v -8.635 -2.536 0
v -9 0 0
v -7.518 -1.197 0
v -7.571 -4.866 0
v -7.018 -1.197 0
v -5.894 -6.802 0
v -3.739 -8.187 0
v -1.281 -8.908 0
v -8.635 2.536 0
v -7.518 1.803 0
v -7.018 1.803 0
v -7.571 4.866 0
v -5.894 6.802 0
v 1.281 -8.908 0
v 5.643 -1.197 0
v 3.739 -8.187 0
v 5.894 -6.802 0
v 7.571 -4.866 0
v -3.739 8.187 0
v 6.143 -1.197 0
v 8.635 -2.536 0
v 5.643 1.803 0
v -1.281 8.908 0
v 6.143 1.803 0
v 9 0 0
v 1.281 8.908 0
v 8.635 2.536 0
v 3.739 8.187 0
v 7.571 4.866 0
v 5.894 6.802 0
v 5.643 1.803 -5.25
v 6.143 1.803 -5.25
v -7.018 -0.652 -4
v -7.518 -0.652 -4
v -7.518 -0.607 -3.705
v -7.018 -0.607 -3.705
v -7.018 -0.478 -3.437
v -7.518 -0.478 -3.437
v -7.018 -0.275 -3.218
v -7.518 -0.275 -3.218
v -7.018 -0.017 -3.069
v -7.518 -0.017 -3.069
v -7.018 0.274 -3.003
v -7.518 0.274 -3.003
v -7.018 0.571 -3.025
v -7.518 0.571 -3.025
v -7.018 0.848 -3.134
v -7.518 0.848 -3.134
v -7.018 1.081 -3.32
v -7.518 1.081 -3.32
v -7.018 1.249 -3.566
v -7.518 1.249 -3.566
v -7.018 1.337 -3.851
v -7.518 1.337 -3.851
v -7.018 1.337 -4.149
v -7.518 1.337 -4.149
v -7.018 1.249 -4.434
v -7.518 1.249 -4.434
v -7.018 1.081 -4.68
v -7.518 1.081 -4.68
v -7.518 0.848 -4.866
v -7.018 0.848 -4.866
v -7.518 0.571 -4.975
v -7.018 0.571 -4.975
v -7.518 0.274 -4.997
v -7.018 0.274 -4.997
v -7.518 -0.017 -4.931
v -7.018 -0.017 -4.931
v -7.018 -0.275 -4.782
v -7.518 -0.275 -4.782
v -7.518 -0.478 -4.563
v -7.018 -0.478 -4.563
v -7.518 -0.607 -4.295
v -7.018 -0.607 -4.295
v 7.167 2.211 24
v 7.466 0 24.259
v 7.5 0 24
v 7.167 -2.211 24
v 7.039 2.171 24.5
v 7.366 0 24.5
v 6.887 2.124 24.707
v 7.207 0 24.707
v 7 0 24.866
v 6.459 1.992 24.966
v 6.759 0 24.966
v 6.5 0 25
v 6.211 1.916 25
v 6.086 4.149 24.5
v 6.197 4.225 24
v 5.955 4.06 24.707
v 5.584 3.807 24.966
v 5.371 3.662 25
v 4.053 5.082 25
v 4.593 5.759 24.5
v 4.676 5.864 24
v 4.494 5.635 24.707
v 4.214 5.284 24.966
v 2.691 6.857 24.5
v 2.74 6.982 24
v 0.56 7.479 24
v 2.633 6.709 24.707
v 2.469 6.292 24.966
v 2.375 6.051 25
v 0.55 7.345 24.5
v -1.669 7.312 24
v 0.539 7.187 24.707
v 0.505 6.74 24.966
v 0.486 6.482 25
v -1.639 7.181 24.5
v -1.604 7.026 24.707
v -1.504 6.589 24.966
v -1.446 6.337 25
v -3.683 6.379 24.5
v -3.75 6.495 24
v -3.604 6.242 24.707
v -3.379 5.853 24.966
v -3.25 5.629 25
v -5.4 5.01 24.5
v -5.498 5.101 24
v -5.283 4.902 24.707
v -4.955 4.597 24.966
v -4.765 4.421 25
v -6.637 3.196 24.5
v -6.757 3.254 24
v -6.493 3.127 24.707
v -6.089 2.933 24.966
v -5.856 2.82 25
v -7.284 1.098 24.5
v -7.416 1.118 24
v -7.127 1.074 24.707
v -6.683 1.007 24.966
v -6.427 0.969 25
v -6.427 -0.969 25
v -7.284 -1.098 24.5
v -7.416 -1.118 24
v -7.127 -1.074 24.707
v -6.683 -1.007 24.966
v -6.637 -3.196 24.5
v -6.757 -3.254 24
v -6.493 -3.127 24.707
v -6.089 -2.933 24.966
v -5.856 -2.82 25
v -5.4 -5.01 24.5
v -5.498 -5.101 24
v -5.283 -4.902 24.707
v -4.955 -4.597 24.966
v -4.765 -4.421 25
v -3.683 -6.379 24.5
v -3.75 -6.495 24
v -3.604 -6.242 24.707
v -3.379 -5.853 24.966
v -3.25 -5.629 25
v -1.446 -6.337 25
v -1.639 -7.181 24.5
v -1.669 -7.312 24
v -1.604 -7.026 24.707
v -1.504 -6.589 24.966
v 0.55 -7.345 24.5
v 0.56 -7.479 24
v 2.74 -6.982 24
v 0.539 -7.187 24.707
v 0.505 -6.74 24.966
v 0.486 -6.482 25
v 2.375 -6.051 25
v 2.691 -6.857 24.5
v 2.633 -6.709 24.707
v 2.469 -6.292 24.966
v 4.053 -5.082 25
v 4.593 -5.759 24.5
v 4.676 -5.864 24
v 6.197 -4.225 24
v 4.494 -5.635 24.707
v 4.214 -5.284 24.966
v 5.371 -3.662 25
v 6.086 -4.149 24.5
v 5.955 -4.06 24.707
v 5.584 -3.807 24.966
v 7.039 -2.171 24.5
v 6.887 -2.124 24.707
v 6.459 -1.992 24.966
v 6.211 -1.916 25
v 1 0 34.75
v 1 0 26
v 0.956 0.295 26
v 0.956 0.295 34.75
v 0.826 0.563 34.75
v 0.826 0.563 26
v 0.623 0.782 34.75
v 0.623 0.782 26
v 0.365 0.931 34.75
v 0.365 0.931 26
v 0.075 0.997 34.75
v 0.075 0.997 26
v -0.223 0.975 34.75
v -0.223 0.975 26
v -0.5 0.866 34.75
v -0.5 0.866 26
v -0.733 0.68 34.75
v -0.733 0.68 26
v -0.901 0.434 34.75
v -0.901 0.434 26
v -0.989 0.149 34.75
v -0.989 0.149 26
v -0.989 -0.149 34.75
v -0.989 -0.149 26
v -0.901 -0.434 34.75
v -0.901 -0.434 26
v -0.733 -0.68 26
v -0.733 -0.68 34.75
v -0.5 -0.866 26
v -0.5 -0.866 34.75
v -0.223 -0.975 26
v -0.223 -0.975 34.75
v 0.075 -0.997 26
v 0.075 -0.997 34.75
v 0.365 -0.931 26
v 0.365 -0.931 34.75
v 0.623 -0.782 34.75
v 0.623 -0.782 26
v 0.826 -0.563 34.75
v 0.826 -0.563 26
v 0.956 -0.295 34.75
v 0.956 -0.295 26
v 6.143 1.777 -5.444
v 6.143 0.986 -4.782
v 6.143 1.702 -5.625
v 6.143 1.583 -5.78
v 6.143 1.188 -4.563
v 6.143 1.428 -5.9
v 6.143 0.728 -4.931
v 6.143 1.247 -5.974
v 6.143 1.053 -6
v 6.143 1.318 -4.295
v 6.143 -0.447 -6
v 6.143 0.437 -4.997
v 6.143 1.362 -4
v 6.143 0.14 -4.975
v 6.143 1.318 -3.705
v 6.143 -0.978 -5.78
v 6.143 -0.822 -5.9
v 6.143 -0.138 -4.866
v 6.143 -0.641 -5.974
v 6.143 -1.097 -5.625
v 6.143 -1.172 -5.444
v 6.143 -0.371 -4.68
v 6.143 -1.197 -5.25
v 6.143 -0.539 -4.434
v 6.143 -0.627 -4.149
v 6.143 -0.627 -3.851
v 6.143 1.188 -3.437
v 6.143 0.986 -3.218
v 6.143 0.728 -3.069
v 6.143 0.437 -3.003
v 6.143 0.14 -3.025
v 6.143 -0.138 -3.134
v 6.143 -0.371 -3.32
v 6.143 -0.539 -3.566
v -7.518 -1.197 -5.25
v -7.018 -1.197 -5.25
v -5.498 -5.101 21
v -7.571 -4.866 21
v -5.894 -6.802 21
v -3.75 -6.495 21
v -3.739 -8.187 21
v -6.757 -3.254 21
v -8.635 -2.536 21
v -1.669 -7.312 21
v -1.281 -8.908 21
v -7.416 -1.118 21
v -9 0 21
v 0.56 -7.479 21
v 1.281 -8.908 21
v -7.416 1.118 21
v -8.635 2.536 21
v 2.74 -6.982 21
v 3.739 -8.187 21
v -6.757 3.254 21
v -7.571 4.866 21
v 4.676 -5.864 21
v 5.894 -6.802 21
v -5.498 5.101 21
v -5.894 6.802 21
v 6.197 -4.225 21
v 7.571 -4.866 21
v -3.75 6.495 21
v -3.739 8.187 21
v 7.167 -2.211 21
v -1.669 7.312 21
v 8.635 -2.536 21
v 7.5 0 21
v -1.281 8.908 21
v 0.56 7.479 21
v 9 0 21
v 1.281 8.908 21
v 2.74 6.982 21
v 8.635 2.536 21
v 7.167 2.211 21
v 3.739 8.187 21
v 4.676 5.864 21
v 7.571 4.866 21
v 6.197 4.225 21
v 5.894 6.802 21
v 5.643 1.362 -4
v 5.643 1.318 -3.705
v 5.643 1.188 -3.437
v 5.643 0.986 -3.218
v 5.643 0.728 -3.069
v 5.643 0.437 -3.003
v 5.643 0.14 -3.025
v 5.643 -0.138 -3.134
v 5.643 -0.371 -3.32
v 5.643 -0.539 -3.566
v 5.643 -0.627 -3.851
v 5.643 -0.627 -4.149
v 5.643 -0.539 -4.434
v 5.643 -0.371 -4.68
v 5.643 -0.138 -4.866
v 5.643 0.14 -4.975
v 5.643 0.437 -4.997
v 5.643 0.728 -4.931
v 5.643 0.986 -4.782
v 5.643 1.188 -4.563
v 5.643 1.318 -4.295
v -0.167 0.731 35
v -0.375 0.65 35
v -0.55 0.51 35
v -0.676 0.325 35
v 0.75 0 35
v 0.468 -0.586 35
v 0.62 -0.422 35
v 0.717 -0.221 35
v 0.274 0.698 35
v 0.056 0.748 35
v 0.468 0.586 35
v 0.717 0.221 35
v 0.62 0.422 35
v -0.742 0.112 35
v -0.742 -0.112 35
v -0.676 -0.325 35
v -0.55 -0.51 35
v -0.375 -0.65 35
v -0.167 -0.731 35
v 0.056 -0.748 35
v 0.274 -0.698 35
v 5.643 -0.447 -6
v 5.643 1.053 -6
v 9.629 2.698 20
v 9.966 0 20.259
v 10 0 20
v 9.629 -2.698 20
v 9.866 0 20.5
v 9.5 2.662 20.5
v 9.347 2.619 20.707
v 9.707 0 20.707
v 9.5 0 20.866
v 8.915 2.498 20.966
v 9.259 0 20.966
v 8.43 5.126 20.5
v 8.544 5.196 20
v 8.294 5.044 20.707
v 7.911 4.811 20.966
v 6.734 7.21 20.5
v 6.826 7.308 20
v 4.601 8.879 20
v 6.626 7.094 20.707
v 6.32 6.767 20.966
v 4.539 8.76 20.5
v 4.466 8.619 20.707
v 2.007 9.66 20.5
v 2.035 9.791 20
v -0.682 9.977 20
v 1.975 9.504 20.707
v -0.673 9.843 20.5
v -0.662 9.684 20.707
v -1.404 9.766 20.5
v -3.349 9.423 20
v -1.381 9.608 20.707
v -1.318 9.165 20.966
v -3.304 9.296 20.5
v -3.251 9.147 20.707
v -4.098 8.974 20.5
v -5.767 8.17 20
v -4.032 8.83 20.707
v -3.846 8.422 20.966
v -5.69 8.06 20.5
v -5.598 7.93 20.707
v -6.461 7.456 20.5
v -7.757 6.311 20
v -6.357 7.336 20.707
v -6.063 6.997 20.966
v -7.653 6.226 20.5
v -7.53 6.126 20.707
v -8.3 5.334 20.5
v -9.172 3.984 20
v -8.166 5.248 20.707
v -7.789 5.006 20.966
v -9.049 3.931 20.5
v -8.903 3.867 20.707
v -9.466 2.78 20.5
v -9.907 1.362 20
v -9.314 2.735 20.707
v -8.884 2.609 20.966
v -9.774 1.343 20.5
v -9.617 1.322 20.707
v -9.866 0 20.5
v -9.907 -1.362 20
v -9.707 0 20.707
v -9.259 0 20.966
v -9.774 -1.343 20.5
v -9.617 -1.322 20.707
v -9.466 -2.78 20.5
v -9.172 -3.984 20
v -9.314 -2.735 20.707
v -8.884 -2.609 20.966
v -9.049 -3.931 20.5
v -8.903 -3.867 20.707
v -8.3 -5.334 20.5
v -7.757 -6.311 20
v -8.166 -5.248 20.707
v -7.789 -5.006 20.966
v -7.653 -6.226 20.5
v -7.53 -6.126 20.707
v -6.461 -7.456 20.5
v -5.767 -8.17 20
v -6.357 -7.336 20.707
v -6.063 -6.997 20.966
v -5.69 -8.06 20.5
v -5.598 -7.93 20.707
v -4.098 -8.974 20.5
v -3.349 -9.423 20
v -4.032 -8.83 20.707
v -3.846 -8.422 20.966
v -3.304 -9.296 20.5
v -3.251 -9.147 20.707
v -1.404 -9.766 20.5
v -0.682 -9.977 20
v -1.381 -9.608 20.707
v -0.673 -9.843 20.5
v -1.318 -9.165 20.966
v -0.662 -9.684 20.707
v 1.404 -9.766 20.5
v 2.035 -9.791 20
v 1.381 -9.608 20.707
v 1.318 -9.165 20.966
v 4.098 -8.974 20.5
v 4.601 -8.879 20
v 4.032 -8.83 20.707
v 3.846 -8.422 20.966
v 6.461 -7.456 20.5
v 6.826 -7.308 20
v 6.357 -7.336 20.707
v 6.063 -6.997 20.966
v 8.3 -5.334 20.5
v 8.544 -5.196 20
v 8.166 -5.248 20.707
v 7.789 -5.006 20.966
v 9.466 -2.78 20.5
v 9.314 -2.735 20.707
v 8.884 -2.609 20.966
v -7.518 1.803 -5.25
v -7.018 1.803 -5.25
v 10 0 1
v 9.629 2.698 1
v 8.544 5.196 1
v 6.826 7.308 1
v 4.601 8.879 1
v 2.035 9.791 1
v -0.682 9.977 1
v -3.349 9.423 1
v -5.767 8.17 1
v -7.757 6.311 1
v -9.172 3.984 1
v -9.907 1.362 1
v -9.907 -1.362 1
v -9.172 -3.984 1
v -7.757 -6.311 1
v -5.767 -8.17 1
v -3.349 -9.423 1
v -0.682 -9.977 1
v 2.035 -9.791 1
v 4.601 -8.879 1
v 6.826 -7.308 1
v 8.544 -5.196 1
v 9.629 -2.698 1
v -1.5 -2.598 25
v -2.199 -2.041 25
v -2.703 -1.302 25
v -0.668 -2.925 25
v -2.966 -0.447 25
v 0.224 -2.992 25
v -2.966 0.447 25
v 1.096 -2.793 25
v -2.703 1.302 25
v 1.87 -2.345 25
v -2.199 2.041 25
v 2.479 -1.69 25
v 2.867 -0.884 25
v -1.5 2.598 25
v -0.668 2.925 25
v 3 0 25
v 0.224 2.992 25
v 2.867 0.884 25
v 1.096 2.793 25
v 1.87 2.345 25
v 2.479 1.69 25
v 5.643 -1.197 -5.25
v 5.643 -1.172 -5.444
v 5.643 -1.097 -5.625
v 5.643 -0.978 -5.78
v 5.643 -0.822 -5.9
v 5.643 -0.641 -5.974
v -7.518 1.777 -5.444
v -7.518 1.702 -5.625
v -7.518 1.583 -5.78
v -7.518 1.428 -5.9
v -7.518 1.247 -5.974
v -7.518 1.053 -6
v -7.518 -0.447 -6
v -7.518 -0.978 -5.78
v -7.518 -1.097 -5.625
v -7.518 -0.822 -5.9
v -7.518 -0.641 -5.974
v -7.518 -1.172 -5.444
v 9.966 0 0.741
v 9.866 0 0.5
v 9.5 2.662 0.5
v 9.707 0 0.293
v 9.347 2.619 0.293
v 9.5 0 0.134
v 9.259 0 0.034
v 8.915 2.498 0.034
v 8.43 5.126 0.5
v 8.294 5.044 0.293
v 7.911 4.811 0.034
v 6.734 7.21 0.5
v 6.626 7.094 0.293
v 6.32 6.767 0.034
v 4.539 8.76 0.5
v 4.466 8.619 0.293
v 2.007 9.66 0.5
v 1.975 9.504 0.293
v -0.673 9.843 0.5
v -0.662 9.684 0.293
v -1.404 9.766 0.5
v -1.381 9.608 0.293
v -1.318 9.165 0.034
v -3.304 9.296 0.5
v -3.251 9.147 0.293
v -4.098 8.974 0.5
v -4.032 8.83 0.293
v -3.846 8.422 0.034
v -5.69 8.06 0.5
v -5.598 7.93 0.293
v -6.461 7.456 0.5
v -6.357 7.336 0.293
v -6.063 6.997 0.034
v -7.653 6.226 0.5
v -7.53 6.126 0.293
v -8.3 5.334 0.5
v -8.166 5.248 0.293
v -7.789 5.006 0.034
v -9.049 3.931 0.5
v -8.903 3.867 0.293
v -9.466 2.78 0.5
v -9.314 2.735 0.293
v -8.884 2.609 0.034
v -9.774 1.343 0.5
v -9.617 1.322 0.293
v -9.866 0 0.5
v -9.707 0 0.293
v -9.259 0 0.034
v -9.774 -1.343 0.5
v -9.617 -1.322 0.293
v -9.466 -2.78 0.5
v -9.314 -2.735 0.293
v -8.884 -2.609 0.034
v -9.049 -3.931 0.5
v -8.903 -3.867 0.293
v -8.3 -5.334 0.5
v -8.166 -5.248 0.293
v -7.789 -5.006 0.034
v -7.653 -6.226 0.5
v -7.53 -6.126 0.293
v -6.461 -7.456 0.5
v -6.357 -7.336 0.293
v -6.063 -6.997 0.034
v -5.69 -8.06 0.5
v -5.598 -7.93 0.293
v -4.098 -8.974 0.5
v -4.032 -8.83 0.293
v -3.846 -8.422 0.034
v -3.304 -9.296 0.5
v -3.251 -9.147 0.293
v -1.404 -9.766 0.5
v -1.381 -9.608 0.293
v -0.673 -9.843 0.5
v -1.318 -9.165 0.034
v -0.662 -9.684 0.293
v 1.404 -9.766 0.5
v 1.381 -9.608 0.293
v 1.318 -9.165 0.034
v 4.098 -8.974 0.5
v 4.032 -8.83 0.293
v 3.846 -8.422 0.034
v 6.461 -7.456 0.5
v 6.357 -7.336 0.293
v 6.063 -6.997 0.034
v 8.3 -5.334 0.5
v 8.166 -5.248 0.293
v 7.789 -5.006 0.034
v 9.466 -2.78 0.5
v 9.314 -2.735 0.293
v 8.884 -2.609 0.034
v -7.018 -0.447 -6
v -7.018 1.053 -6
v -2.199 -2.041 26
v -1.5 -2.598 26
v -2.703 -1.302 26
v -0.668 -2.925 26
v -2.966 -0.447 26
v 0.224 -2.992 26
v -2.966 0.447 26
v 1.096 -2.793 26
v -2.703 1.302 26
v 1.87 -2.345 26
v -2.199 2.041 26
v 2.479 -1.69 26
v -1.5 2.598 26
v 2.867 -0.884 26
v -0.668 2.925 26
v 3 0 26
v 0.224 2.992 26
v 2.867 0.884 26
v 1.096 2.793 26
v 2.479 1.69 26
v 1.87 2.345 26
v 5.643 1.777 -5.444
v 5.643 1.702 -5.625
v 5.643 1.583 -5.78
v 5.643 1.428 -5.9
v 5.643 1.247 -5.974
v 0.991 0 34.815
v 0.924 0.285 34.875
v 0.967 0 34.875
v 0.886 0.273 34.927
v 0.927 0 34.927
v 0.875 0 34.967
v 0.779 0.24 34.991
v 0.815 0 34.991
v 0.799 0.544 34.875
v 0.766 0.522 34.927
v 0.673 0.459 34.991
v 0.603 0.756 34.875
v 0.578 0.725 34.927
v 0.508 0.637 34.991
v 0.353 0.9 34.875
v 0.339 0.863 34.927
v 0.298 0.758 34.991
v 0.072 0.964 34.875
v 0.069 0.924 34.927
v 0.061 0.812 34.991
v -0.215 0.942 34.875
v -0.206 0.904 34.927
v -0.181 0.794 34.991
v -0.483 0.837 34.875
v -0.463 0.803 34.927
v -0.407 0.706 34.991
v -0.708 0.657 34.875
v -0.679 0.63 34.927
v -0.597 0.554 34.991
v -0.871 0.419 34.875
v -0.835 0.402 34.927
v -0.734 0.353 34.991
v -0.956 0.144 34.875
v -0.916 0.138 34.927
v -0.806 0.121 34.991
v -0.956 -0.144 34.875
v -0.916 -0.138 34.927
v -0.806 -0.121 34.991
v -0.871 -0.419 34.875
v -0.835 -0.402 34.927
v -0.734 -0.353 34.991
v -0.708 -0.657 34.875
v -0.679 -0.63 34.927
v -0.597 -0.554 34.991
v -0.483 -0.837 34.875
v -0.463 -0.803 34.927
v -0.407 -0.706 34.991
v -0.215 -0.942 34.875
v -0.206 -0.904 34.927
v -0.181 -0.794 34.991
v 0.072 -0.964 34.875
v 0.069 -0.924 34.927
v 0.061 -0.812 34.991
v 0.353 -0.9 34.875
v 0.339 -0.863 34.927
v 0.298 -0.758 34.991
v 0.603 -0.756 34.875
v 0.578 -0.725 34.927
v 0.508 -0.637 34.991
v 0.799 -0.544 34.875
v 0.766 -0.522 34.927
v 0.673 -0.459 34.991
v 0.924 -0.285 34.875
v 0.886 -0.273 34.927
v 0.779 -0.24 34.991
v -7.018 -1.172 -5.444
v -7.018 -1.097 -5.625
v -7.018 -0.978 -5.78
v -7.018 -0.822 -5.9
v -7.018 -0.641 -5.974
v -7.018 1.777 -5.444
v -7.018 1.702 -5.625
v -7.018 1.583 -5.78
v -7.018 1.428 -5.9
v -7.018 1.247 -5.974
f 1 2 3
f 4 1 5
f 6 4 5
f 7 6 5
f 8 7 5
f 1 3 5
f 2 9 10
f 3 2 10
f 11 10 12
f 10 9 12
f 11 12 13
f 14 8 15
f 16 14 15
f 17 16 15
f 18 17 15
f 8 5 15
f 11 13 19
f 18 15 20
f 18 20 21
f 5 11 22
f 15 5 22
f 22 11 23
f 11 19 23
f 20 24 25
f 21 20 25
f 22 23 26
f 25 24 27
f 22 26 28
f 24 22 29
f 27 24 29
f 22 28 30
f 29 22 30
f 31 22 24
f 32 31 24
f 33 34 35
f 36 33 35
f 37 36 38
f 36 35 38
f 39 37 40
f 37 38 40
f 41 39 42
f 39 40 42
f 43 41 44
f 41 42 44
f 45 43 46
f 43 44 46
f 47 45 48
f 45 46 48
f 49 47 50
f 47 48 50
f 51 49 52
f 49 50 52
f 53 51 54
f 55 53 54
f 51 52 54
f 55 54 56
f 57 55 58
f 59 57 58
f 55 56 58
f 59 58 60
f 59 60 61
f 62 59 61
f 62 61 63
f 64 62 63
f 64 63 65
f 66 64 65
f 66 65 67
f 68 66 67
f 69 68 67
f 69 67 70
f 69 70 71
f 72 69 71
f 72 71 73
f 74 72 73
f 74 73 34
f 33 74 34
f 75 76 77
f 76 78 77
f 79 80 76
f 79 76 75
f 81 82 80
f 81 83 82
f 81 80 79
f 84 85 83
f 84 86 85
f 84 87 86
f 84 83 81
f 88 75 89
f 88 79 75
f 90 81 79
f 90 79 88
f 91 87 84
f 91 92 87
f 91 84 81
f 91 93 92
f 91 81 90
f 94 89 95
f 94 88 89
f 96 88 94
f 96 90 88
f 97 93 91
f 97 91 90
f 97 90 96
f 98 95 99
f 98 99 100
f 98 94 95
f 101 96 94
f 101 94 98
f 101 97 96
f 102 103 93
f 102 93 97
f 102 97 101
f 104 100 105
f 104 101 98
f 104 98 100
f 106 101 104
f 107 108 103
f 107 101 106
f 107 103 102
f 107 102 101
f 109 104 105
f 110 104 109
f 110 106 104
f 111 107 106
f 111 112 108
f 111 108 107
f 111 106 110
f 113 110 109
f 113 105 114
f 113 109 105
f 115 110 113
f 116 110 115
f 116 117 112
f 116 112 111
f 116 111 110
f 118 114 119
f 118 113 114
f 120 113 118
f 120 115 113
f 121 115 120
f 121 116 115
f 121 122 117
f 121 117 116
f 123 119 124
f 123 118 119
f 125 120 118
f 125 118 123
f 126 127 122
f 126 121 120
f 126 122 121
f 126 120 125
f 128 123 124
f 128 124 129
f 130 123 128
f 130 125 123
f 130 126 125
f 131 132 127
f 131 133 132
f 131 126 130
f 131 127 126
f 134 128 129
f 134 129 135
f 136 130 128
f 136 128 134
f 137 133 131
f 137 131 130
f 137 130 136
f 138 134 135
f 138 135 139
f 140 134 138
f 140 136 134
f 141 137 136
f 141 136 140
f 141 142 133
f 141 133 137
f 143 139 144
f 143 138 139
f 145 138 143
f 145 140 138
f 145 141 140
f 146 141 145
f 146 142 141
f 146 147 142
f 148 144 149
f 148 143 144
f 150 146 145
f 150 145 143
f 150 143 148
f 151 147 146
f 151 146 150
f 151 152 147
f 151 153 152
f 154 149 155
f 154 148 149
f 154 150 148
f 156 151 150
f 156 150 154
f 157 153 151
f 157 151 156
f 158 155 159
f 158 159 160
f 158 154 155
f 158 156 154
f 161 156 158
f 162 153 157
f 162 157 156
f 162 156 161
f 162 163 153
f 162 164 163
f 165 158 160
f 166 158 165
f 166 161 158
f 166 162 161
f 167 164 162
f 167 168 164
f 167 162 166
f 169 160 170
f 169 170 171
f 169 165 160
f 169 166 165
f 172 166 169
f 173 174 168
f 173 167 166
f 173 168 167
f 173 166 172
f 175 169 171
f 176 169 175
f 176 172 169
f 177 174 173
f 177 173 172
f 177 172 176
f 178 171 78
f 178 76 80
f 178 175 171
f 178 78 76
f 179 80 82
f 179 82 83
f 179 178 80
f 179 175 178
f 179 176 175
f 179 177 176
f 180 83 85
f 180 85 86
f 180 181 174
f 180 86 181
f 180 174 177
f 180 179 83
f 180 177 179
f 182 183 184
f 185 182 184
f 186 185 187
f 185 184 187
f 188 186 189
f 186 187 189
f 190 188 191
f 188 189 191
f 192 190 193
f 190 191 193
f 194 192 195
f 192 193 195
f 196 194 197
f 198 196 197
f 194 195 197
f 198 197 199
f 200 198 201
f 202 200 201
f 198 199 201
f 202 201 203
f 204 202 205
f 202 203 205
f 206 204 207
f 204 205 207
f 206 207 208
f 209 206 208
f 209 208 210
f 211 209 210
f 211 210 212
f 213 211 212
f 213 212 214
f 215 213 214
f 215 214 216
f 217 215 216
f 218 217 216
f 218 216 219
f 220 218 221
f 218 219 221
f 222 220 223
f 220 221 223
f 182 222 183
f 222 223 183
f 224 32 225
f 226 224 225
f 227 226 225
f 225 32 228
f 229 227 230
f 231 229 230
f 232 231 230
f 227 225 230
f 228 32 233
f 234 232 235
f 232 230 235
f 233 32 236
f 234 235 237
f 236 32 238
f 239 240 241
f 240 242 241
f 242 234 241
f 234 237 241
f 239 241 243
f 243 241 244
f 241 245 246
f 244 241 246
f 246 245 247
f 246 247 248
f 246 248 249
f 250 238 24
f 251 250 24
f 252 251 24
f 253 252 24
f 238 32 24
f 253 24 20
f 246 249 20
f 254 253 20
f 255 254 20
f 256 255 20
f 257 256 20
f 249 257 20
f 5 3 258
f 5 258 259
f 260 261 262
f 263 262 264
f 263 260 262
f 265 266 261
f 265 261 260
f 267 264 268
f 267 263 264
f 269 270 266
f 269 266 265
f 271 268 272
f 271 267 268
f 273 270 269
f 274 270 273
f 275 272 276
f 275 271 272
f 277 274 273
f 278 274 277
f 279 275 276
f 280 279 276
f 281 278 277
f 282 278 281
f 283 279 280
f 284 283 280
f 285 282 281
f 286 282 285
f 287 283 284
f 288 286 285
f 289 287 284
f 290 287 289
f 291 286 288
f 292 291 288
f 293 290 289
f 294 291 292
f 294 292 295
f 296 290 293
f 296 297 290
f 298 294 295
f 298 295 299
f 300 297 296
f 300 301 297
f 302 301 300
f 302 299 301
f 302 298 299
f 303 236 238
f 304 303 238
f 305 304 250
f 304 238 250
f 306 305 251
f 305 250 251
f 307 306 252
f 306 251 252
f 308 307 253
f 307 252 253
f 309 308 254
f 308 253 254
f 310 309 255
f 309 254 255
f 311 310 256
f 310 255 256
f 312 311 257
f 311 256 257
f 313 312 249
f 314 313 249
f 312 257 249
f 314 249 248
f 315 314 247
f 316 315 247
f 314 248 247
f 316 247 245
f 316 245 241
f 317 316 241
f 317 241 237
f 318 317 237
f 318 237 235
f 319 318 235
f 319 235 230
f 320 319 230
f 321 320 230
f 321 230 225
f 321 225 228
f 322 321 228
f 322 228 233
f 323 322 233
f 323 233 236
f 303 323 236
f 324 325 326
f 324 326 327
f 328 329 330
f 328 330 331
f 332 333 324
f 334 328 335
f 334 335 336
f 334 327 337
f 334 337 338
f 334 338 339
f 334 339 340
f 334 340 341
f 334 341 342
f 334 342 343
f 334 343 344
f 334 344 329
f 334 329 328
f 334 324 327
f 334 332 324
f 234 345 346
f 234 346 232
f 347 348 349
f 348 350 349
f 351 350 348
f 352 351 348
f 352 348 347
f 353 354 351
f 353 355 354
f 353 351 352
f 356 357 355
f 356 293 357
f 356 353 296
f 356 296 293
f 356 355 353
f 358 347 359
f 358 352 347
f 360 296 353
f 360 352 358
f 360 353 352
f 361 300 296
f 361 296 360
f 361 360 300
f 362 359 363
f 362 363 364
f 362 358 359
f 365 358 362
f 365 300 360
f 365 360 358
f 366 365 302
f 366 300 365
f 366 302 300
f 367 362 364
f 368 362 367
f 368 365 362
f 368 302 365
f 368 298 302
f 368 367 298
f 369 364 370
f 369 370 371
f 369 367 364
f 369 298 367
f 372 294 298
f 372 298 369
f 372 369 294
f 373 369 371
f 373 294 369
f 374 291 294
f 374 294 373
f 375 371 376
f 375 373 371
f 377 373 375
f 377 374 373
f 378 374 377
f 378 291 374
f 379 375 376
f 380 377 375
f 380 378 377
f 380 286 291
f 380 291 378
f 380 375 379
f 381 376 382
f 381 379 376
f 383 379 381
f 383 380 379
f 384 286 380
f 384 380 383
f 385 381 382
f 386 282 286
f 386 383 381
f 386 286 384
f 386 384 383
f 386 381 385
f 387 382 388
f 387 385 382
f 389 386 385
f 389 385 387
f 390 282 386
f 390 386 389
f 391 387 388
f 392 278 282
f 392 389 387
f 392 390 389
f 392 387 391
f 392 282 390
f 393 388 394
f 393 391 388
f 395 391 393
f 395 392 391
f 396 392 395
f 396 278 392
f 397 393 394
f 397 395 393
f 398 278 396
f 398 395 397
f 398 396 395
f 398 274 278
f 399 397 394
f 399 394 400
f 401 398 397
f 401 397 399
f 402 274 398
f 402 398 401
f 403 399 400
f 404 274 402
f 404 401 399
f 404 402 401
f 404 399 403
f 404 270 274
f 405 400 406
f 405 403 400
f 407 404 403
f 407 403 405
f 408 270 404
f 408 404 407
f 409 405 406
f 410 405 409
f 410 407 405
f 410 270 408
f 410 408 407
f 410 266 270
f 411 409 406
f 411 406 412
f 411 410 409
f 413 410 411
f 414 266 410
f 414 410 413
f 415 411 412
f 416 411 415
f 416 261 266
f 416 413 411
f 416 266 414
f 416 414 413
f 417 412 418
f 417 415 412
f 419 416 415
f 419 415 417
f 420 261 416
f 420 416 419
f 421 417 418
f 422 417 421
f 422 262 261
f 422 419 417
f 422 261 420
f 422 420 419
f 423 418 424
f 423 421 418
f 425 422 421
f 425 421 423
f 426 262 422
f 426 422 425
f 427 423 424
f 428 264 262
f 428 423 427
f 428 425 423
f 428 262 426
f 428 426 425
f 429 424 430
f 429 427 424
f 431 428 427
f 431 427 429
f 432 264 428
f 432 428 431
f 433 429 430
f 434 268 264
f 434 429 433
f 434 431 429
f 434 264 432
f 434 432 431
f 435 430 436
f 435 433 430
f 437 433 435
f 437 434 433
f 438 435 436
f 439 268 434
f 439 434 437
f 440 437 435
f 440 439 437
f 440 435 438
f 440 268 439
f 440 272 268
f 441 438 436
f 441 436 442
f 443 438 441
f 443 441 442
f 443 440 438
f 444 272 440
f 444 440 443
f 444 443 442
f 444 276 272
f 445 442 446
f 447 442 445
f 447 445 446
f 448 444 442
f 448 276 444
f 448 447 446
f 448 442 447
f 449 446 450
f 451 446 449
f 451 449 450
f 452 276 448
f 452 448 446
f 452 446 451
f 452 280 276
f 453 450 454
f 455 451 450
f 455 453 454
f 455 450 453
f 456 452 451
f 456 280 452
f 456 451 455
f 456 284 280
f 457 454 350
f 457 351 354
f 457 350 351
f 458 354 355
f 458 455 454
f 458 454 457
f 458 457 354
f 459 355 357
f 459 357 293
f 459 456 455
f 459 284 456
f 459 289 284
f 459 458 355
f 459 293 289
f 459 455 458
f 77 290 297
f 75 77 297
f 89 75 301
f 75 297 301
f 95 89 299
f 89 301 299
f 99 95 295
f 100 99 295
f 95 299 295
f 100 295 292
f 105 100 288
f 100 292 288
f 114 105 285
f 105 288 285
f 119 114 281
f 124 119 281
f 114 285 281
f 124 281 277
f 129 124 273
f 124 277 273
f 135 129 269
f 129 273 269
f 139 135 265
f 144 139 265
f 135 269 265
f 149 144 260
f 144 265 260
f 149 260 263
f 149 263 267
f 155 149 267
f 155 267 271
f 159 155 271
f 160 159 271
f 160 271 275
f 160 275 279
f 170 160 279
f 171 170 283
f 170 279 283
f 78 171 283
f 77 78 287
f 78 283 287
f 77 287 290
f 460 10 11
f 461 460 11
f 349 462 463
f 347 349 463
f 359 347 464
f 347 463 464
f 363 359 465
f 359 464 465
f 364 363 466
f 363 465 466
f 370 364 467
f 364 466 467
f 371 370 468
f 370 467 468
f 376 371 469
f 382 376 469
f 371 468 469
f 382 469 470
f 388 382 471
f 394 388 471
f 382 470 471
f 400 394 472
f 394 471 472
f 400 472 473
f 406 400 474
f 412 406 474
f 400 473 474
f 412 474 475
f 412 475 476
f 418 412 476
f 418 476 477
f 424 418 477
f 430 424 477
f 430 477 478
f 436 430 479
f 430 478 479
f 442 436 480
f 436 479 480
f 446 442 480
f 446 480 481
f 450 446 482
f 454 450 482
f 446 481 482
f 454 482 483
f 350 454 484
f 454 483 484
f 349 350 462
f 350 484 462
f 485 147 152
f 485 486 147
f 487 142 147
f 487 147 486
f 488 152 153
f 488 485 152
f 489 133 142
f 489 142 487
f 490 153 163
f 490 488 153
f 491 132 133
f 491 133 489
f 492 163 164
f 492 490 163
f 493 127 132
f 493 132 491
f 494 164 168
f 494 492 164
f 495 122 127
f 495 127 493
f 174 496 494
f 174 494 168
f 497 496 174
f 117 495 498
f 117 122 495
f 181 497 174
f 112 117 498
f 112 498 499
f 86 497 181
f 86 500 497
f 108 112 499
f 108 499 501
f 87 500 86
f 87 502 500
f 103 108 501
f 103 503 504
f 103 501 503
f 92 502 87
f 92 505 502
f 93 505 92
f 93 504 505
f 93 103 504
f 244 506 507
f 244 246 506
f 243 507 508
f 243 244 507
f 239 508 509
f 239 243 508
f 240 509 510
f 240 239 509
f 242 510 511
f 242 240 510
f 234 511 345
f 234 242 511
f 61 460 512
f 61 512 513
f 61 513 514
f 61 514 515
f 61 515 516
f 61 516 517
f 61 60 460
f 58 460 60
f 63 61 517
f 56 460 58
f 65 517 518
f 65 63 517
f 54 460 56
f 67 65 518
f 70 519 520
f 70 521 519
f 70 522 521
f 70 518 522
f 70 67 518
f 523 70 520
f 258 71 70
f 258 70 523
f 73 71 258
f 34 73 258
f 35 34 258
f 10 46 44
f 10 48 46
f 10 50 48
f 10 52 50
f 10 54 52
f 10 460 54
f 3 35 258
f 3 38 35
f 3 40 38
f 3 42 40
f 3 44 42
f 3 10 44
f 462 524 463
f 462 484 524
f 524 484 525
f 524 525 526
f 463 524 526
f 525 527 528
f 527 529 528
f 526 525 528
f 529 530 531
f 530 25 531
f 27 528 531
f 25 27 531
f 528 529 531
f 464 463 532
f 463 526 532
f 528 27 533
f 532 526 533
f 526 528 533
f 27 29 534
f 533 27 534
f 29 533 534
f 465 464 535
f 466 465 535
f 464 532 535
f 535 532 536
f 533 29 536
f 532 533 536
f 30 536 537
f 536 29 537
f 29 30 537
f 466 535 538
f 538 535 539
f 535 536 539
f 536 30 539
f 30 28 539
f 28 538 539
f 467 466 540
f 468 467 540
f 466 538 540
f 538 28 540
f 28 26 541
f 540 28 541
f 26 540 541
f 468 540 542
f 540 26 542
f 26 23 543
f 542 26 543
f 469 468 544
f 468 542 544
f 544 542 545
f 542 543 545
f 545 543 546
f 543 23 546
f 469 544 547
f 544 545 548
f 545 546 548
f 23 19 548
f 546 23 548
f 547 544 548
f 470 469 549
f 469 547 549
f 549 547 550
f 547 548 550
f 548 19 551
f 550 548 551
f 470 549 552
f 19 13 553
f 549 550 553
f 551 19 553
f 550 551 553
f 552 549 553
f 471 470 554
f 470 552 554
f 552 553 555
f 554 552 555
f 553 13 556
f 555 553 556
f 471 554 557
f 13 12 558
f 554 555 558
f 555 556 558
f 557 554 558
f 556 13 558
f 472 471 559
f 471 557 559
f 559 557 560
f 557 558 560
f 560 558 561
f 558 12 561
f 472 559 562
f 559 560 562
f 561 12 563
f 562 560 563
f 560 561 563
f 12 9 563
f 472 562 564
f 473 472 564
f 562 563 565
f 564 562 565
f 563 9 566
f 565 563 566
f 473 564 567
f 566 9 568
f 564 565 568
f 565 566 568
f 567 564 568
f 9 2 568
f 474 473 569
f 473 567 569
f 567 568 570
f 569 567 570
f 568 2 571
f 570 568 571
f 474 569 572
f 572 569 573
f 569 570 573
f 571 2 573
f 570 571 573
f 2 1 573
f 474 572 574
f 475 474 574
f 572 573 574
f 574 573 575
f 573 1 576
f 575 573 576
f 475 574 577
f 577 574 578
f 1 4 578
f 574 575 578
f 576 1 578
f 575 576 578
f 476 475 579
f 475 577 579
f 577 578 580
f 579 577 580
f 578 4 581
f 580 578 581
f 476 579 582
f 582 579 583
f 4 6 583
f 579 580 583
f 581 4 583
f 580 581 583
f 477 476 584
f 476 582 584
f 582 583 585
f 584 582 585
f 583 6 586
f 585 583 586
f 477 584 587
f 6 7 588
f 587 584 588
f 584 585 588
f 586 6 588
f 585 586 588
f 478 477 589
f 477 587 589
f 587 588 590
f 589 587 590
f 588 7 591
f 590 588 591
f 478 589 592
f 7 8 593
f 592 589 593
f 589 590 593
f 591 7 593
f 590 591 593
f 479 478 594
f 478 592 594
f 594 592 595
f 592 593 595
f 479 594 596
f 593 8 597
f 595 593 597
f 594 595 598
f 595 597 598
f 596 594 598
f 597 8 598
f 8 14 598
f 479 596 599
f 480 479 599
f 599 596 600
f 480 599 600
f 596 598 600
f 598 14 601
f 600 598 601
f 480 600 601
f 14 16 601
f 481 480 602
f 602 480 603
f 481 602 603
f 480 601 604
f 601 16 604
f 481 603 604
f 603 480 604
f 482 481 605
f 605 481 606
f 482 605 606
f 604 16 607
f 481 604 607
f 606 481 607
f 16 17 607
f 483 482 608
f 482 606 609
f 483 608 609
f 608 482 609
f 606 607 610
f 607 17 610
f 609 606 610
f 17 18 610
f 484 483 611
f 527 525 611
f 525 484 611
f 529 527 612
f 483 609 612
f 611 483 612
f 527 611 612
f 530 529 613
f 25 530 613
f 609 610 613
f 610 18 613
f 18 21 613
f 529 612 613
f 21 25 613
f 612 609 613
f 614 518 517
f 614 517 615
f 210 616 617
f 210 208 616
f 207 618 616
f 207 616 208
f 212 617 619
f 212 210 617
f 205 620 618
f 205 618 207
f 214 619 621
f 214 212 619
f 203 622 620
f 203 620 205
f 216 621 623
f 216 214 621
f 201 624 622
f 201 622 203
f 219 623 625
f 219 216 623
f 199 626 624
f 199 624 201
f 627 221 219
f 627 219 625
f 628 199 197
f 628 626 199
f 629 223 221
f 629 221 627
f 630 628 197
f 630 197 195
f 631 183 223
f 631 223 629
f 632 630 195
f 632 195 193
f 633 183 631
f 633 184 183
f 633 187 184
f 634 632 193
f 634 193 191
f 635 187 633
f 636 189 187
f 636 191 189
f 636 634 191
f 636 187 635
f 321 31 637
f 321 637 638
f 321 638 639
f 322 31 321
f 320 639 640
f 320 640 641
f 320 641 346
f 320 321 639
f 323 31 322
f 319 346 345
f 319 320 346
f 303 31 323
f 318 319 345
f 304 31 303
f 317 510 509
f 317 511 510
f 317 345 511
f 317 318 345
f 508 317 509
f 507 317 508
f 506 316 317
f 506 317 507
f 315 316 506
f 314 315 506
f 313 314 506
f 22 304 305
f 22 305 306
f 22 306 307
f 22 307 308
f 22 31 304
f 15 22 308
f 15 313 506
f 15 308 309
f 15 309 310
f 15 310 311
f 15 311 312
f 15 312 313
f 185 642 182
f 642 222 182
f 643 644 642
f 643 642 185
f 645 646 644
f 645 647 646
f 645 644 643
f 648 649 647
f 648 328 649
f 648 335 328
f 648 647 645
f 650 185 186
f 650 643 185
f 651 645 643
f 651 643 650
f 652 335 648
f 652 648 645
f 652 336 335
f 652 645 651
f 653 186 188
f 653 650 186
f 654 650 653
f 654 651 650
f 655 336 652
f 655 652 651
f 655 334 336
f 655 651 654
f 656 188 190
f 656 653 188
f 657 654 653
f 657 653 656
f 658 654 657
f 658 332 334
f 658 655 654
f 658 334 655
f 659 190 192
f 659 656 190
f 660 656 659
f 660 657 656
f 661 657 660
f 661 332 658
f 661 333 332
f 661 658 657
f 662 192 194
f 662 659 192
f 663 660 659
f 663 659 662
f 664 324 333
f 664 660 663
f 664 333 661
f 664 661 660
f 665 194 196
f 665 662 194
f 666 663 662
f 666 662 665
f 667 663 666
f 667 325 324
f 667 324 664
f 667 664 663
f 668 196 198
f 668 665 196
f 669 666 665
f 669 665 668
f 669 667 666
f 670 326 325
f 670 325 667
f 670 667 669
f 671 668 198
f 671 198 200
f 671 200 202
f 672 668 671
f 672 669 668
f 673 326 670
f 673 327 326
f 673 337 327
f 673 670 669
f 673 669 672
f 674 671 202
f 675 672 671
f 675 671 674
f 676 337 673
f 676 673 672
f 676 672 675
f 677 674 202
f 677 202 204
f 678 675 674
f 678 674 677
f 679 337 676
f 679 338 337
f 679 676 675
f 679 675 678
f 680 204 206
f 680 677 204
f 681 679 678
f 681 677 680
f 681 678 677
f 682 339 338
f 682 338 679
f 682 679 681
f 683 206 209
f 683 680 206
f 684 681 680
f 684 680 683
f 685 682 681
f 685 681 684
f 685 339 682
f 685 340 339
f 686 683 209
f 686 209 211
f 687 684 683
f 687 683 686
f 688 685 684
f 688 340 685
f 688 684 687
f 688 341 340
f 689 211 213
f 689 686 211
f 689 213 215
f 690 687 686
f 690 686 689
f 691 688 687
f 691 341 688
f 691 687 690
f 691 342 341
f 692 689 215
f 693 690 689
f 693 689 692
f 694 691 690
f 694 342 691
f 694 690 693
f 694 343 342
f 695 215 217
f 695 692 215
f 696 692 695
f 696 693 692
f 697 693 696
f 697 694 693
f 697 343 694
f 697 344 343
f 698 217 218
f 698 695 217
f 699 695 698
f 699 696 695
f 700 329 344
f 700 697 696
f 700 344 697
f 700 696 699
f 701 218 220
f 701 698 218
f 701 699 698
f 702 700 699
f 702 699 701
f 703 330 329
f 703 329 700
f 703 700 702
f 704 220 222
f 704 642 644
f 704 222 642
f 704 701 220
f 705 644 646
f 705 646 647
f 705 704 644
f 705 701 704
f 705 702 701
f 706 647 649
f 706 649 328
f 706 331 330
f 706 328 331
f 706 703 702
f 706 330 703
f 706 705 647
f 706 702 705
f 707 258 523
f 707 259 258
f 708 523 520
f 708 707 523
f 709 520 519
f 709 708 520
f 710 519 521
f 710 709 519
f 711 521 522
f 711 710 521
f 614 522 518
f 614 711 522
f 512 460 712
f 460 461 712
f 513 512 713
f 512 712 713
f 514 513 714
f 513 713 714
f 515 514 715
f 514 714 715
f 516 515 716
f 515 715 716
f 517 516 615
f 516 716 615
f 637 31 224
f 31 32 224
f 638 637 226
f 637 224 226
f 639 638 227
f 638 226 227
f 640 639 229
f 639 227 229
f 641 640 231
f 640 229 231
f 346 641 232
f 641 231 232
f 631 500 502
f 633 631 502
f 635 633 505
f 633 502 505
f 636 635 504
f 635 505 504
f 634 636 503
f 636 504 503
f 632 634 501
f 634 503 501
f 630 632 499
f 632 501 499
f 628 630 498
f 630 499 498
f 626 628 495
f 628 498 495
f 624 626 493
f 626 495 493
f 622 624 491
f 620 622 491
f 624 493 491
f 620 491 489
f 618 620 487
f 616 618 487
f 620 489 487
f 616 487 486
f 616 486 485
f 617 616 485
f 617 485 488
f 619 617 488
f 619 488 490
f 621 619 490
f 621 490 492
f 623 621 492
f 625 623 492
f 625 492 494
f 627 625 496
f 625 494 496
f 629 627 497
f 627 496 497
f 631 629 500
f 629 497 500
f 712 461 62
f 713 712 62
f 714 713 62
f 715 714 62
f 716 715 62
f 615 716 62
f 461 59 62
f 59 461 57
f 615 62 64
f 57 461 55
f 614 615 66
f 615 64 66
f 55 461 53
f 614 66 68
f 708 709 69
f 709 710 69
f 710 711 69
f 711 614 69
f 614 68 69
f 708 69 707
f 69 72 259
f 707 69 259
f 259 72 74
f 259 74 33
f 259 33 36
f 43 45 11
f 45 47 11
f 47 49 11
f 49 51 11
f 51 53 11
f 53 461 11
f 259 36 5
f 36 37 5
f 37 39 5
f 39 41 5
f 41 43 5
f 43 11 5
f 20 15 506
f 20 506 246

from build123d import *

# Parameters (mm, degrees)
F0_R      = 10
F1_DEPTH  = 21
F2_R      = 7.5
F3_DEPTH  = 4
F4_R      = 3
F5_DEPTH  = 1
F6_R      = 1
F7_R      = 1
F8_R      = 1
F9_R      = 1
F10_DEPTH = 9
F11_R     = 0.25
F12_W     = 0.5
F12_H     = 3
F13_DEPTH = 6
F14_R     = 1
F15_DEPTH = 3
F16_R     = 1
F17_DEPTH = 3
F18_R     = 0.75
F19_R     = 0.75


with BuildPart() as f1:
    # F0 (on Top) → F1 (new body)
    with BuildSketch(Plane.XY):
        Circle(F0_R)
    extrude(amount=F1_DEPTH)

    # F2 (on face) → F3 (join)
    with BuildSketch(Plane.XY.offset(21)):
        Circle(F2_R)
    extrude(amount=F3_DEPTH)

    # F4 (on face) → F5 (join)
    with BuildSketch(Plane.XY.offset(25)):
        Circle(F4_R)
    extrude(amount=F5_DEPTH)

    # F6
    f6_edges = [f1.edges().sort_by_distance(p)[0] for p in [
        (-10, 0, 0),
    ]]
    fillet(f6_edges, radius=F6_R)

    # F7
    f7_edges = [f1.edges().sort_by_distance(p)[0] for p in [
        (-10, 0, 21),
    ]]
    fillet(f7_edges, radius=F7_R)

    # F8
    f8_edges = [f1.edges().sort_by_distance(p)[0] for p in [
        (-7.5, 0, 25),
    ]]
    fillet(f8_edges, radius=F8_R)

    # F9 (on face) → F10 (join)
    with BuildSketch(Plane.XY.offset(26)):
        Circle(F9_R)
    extrude(amount=F10_DEPTH)

    # F11
    f11_edges = [f1.edges().sort_by_distance(p)[0] for p in [
        (-1, 0, 35),
    ]]
    fillet(f11_edges, radius=F11_R)

    # F12 (on face) → F13 (join)
    with BuildSketch(Plane(origin=(0, 0, 0), x_dir=(1, 0, 0), z_dir=(0, 0, -1))):
        with Locations((-7.267895, -0.302635)):
            Rectangle(F12_W, F12_H)
        with Locations((5.892853, -0.302635)):
            Rectangle(F12_W, F12_H)
    extrude(amount=F13_DEPTH)

    # F14 (on face) → F15 (cut)
    with BuildSketch(Plane(origin=(-7.517895, 0, 0), x_dir=(0, -1, 0), z_dir=(-1, 0, 0))):
        with Locations((-0.34836, -4)):
            Circle(F14_R)
    extrude(amount=-F15_DEPTH, mode=Mode.SUBTRACT)

    # F16 (on face) → F17 (cut)
    with BuildSketch(Plane.YZ.offset(6.142853)):
        with Locations((0.362238, -4)):
            Circle(F16_R)
    extrude(amount=-F17_DEPTH, mode=Mode.SUBTRACT)

    # F18
    f18_edges = [f1.edges().sort_by_distance(p)[0] for p in [
        (-7.267895, -1.197365, -6),
        (-7.267895, 1.802635, -6),
    ]]
    fillet(f18_edges, radius=F18_R)

    # F19
    f19_edges = [f1.edges().sort_by_distance(p)[0] for p in [
        (5.892853, -1.197365, -6),
        (5.892853, 1.802635, -6),
    ]]
    fillet(f19_edges, radius=F19_R)


solid = f1.part
